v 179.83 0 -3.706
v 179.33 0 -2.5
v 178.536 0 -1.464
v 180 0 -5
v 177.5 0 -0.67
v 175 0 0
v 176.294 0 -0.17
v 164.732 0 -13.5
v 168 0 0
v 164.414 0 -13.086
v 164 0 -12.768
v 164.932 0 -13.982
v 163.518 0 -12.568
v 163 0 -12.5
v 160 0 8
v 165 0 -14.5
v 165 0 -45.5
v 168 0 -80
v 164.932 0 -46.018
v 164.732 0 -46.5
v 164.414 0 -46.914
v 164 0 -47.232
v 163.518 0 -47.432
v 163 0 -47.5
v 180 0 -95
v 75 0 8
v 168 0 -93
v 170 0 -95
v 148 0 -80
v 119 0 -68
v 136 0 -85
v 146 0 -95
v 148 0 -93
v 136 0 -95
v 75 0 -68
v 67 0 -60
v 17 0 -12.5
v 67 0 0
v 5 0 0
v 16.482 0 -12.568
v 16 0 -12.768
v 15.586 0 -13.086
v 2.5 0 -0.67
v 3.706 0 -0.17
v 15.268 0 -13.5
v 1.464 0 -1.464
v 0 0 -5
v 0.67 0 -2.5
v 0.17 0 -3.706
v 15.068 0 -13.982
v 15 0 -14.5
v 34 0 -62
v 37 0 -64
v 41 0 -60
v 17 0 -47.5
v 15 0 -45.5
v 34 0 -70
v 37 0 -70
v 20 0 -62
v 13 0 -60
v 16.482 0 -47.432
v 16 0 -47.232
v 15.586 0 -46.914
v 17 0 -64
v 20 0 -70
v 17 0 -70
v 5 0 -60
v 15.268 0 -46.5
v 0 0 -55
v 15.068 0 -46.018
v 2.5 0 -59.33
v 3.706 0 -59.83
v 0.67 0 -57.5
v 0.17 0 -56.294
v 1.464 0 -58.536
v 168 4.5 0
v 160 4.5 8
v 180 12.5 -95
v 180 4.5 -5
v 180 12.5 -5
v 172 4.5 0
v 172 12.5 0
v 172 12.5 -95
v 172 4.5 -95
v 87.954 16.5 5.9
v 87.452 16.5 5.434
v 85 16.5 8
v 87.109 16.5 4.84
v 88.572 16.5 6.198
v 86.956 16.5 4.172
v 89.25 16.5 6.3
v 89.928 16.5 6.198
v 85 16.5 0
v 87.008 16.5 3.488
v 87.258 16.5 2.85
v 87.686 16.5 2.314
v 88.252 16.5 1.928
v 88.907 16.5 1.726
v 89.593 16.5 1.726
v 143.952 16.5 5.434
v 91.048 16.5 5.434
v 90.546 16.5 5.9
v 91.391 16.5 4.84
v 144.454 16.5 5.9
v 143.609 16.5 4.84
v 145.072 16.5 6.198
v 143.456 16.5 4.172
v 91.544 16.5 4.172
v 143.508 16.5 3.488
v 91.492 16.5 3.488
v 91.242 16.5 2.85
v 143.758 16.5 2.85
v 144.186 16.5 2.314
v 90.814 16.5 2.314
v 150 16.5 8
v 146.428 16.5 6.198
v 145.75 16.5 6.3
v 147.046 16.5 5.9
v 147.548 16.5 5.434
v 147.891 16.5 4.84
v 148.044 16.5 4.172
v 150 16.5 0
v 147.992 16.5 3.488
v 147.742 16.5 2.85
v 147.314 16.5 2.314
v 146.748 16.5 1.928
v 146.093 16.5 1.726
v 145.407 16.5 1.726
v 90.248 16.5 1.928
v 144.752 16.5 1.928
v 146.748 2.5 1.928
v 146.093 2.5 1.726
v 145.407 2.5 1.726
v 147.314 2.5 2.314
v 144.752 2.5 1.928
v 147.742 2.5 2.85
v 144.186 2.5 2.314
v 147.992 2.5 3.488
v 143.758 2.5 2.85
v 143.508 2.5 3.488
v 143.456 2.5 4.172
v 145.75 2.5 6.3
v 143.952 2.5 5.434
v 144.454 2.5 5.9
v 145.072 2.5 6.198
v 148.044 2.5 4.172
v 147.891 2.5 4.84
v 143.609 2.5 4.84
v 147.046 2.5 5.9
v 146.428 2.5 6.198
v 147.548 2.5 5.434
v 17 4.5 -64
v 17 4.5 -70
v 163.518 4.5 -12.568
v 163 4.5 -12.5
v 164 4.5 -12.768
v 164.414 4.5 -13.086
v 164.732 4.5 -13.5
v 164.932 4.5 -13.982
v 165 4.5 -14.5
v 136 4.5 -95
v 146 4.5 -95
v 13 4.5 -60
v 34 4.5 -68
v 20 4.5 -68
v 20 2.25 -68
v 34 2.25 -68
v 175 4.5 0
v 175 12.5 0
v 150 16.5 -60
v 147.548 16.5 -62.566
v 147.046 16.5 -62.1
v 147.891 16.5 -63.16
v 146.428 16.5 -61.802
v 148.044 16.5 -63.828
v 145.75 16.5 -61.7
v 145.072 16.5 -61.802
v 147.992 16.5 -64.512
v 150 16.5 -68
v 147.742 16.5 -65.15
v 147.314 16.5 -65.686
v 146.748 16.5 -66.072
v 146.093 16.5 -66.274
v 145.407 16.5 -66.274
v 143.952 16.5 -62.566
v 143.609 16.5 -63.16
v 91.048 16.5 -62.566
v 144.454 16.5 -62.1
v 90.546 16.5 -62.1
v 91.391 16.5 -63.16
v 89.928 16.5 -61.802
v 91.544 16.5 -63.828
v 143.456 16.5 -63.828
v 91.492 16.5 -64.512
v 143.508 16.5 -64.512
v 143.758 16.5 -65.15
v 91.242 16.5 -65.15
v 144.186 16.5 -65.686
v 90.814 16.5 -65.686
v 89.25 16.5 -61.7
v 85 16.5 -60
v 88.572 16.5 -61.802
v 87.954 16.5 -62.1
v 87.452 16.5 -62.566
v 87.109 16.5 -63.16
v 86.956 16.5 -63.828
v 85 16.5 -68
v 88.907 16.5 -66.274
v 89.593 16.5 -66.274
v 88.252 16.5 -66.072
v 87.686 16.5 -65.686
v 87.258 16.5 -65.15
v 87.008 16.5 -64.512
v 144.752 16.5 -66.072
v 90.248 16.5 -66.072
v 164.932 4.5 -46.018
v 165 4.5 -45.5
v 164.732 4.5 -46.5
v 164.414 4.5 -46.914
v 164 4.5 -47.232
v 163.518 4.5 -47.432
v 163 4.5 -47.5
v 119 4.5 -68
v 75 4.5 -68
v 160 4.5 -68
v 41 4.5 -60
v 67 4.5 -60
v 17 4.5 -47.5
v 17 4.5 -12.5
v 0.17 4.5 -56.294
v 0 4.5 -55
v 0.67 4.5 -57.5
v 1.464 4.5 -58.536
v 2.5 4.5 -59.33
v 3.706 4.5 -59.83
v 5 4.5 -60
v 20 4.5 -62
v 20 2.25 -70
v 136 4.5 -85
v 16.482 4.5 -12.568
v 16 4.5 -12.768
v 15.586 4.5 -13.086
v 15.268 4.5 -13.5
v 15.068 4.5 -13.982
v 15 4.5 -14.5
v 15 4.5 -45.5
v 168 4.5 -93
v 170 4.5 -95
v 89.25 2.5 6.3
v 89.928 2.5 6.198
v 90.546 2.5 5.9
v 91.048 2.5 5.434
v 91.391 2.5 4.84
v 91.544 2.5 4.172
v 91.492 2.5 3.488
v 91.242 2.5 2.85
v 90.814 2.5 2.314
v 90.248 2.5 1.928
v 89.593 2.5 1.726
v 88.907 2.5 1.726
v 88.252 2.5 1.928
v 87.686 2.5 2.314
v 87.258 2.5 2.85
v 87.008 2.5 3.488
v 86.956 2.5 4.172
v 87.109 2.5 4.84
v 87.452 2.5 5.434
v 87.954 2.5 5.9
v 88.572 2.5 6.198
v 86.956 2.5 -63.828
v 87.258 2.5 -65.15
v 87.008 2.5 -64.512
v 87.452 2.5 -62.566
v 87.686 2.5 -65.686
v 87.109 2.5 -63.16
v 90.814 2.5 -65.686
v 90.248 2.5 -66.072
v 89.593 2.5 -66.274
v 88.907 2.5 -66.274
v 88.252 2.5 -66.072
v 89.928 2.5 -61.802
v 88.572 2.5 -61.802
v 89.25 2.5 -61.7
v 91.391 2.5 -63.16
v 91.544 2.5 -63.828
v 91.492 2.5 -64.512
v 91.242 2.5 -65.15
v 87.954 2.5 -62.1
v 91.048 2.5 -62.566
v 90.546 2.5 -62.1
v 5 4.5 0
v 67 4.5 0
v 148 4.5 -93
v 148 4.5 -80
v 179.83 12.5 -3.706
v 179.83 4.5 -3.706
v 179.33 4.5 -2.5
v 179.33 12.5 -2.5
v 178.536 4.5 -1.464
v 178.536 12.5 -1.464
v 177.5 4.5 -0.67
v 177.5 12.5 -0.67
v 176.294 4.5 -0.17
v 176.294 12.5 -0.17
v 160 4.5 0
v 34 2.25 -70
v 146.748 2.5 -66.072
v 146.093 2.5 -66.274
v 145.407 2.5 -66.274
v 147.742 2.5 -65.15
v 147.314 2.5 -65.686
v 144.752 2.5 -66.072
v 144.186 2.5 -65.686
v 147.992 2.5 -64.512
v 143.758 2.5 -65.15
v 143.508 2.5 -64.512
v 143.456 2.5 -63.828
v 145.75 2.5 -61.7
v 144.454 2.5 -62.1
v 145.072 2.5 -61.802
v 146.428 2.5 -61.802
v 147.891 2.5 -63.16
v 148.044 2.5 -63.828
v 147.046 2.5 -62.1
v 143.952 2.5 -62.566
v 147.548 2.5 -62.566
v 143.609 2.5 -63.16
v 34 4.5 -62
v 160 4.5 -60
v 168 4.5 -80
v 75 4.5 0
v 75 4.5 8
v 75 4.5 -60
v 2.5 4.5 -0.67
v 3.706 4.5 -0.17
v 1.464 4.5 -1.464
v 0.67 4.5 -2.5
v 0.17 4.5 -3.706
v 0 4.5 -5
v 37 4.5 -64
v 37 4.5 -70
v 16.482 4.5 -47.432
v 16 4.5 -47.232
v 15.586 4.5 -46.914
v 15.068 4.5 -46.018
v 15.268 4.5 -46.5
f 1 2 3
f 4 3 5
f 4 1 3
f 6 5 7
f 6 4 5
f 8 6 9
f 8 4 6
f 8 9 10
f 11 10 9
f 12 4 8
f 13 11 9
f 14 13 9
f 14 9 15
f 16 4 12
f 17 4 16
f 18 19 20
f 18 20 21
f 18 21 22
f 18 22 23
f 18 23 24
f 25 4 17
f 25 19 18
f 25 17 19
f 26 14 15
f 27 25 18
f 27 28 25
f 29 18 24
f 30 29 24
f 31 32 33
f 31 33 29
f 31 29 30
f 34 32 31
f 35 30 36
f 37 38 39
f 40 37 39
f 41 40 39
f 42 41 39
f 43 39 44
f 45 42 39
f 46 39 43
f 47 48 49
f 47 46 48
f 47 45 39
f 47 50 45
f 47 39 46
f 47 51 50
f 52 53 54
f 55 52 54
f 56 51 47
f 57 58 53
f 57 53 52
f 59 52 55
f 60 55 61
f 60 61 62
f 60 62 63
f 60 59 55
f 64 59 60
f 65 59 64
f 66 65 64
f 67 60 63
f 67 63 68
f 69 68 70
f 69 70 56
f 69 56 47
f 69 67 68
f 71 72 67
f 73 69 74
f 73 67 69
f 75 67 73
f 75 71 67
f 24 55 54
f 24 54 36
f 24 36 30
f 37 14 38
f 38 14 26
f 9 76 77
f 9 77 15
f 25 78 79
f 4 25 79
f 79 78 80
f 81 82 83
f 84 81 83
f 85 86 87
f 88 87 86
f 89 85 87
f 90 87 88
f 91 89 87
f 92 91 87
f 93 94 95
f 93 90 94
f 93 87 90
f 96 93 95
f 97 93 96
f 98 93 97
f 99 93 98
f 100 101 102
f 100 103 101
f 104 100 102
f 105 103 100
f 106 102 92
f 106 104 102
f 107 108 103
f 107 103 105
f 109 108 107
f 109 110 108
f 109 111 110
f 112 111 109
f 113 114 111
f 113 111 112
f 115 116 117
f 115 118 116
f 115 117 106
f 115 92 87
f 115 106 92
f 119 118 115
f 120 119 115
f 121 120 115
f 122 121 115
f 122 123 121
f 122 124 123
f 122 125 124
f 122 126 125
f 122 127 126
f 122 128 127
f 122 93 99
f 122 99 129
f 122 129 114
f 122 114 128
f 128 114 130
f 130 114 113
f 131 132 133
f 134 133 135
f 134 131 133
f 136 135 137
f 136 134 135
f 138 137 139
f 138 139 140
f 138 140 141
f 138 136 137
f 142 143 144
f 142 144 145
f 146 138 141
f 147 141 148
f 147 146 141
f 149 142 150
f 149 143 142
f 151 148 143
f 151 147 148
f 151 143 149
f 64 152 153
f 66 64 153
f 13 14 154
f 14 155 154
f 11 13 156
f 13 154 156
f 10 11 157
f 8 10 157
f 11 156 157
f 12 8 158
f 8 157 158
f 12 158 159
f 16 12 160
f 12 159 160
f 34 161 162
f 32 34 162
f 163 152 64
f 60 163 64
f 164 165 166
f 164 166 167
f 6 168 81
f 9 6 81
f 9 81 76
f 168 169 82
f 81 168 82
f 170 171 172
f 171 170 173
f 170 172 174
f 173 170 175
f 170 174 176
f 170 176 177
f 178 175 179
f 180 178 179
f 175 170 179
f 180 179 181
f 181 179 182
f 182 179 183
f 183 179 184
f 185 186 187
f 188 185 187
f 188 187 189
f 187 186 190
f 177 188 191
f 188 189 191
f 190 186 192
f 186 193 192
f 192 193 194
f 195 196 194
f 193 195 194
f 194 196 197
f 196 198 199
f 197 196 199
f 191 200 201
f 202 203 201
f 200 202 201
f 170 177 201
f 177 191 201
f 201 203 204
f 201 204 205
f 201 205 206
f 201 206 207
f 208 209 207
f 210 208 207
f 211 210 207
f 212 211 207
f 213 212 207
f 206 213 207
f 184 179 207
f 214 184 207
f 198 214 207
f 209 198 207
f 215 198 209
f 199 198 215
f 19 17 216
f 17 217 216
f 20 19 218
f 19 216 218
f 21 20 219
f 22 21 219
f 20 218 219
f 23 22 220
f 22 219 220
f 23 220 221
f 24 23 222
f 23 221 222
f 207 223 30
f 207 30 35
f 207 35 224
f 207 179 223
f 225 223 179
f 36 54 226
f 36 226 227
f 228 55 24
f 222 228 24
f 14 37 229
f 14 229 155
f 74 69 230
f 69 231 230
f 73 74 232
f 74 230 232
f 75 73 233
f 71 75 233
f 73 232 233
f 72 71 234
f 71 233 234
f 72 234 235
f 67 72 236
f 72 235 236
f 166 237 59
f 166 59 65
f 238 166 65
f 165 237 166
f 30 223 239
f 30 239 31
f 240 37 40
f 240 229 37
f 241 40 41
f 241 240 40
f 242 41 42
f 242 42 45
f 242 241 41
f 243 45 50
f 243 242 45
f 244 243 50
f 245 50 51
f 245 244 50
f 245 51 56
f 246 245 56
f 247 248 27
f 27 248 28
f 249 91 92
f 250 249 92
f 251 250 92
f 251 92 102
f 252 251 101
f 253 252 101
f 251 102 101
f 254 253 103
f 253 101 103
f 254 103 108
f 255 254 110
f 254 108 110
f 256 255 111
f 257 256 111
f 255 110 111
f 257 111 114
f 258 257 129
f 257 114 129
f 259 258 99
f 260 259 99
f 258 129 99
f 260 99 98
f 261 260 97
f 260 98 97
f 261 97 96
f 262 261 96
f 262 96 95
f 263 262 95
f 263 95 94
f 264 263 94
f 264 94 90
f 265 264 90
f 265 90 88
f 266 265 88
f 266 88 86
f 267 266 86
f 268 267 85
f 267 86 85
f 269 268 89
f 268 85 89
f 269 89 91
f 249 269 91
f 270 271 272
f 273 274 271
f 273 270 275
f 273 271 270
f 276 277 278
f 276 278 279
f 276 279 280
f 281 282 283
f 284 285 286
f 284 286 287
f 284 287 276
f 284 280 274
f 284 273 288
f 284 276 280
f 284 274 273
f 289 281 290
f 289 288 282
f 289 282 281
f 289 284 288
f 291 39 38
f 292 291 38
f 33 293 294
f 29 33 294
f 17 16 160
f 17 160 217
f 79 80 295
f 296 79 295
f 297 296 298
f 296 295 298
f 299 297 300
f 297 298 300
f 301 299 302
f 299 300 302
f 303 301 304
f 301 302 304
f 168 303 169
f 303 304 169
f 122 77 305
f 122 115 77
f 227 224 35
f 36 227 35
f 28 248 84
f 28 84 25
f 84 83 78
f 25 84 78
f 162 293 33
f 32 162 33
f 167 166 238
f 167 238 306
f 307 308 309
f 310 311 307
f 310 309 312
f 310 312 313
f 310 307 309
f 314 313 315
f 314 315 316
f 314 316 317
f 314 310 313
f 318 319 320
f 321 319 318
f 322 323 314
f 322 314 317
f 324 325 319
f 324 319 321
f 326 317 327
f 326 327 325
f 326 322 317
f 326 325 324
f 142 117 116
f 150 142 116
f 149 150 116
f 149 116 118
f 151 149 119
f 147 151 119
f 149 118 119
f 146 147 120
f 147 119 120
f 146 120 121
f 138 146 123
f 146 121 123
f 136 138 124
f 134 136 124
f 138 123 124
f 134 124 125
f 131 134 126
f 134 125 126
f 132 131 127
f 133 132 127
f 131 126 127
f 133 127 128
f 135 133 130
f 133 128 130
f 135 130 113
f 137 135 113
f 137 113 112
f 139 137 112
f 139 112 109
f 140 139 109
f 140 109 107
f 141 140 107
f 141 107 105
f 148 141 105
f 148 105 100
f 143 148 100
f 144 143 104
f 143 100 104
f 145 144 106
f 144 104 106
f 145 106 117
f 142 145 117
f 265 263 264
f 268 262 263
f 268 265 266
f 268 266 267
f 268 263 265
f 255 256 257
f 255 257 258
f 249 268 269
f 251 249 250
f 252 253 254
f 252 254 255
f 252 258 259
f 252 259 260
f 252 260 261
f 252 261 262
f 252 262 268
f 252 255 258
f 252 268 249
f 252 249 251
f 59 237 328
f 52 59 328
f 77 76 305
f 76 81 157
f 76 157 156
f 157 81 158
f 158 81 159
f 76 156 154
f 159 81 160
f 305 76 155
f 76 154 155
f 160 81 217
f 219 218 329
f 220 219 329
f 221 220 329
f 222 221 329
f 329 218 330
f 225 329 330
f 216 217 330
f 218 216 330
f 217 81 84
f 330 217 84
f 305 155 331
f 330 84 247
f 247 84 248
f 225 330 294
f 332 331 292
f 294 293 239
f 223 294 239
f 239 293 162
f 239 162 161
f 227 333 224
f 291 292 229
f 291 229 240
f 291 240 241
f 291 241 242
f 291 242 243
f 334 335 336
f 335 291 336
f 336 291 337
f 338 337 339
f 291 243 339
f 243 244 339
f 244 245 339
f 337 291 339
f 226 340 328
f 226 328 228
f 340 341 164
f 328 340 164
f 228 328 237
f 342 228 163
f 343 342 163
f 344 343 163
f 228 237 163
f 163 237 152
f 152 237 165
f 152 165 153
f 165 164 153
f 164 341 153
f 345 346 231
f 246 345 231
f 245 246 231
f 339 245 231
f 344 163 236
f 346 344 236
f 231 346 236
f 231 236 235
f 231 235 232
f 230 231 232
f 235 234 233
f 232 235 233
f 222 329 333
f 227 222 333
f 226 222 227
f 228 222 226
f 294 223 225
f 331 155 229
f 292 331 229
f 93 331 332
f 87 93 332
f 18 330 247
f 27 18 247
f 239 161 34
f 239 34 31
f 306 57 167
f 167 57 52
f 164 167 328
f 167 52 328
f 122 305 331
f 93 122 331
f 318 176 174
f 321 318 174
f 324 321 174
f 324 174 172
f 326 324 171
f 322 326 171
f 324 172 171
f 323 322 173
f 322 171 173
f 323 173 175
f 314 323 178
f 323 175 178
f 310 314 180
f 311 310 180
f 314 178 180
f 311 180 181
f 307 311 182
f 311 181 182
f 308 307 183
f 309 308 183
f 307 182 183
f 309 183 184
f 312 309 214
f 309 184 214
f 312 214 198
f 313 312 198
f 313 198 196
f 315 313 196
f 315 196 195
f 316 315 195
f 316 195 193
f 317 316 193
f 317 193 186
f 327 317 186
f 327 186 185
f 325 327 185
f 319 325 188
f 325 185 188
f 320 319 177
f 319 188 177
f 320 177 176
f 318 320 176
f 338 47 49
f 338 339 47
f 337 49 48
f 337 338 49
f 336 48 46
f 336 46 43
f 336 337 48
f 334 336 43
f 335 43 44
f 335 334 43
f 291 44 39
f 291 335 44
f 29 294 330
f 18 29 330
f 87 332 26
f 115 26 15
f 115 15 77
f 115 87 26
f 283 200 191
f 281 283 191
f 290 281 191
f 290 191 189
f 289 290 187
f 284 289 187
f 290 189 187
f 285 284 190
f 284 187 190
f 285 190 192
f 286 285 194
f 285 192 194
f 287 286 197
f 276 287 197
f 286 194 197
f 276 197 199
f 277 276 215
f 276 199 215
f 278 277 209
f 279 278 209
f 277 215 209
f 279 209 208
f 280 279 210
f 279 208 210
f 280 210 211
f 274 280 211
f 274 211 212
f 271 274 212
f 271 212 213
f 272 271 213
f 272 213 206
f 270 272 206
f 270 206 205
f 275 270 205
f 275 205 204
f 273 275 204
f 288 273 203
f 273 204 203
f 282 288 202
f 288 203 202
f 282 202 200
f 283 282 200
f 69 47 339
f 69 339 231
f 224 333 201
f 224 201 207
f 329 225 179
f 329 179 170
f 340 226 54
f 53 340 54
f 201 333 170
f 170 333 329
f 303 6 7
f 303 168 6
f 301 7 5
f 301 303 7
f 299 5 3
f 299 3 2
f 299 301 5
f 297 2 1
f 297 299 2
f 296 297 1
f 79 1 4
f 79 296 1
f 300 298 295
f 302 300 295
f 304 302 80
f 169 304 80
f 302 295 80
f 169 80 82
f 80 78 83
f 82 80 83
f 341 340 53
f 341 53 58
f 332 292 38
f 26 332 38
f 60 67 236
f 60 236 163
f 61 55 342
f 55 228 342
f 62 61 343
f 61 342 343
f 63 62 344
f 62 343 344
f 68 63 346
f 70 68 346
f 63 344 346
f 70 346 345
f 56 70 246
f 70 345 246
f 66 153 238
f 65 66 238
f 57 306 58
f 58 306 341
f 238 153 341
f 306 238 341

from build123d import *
from OCP.BRepFilletAPI import BRepFilletAPI_MakeChamfer

# Parameters (mm, degrees)
SKETCH1_W                       = 180
SKETCH1_H                       = 60
SKETCH1_W_2                     = 150
SKETCH1_H_2                     = 35
BOSS_EXTRUDE1_DEPTH             = 4.5
FILLET1_R                       = 5
FILLET2_R                       = 2
BOSS_EXTRUDE2_DEPTH             = 4.5
CHAMFER1_SIZE                   = 25
CHAMFER2_SIZE                   = 2
BOSS_EXTRUDE3_DEPTH             = 12
BOSS_EXTRUDE3_DIRECTION_2_REACH = 205.581
CHAMFER3_SIZE                   = 10
CHAMFER3_SIZE_2                 = 12
CHAMFER4_SIZE                   = 8
BOSS_EXTRUDE4_START             = 8
BOSS_EXTRUDE4_DEPTH             = 8
SKETCH5_R                       = 2.3
CUT_EXTRUDE1_DEPTH              = 14
CHAMFER5_SIZE                   = 12
CHAMFER5_SIZE2                  = 10
SKETCH6_W                       = 20
SKETCH6_H                       = 10
SKETCH6_W_2                     = 14
SKETCH6_H_2                     = 6
BOSS_EXTRUDE5_DEPTH             = 4.5
CHAMFER6_SIZE                   = 4
SKETCH7_W                       = 14
SKETCH7_H                       = 2.25
CUT_EXTRUDE2_DEPTH              = 3


with BuildPart() as part:
    # Sketch1 → Boss-Extrude1 (new body)
    with BuildSketch(Plane(origin=(0, 0, 0), x_dir=(1, 0, 0), z_dir=(0, 1, 0))):
        with Locations((90, 30)):
            Rectangle(SKETCH1_W, SKETCH1_H)
        with Locations((90, 30)):
            Rectangle(SKETCH1_W_2, SKETCH1_H_2, mode=Mode.SUBTRACT)
    extrude(amount=BOSS_EXTRUDE1_DEPTH)

    # Fillet1
    fillet1_edges = [part.edges().sort_by_distance(p)[0] for p in [
        (0, 2.25, -60),
        (180, 2.25, 0),
        (0, 2.25, 0),
    ]]
    fillet(fillet1_edges, radius=FILLET1_R)

    # Fillet2
    fillet2_edges = [part.edges().sort_by_distance(p)[0] for p in [
        (165, 2.25, -12.5),
        (165, 2.25, -47.5),
        (15, 2.25, -47.5),
        (15, 2.25, -12.5),
    ]]
    fillet(fillet2_edges, radius=FILLET2_R)

    # Sketch2 → Boss-Extrude2 (add)
    with BuildSketch(Plane(origin=(0, 4.5, 0), x_dir=(1, 0, 0), z_dir=(0, 1, 0))):
        Polygon((180, 80), (180, 60), (136, 60), (136, 80), (136, 95), (148, 95), (148, 80), (168, 80), (168, 95), (180, 95), align=None)
    extrude(amount=-BOSS_EXTRUDE2_DEPTH)

    # Chamfer1
    chamfer1_edges = [part.edges().sort_by_distance(p)[0] for p in [
        (136, 2.25, -60),
    ]]
    chamfer(chamfer1_edges, length=CHAMFER1_SIZE)

    # Chamfer2
    chamfer2_edges = [part.edges().sort_by_distance(p)[0] for p in [
        (168, 2.25, -95),
        (148, 2.25, -95),
    ]]
    chamfer(chamfer2_edges, length=CHAMFER2_SIZE)

    # Sketch3 → Boss-Extrude3 (add)
    with BuildSketch(Plane(origin=(0, 4.5, 0), x_dir=(1, 0, 0), z_dir=(0, 1, 0))):
        Polygon((90, -8), (160, -8), (160, 0), (90, 0), (75, 0), (75, -8), align=None)
        Polygon((160, 60), (90, 60), (75, 60), (75, 68), (90, 68), (160, 68), align=None)
    extrude(amount=BOSS_EXTRUDE3_DEPTH)

    # Boss-Extrude3 direction 2: up to this face of the body (flat: up to its plane)
    boss_extrude3_direction_2_end = Plane(part.part.faces().sort_by_distance((141, 0, -92.964686756))[0])
    # Sketch3 → Boss-Extrude3 direction 2 (add, up to the picked face)
    with BuildSketch(Plane(origin=(0, 4.5, 0), x_dir=(1, 0, 0), z_dir=(0, 1, 0)), mode=Mode.PRIVATE) as boss_extrude3_direction_2_sk1:
        Polygon((90, -8), (160, -8), (160, 0), (90, 0), (75, 0), (75, -8), align=None)
    boss_extrude3_direction_2_tool1 = split(extrude(boss_extrude3_direction_2_sk1.sketch, amount=-BOSS_EXTRUDE3_DIRECTION_2_REACH, mode=Mode.PRIVATE), bisect_by=boss_extrude3_direction_2_end, keep=Keep.BOTH, mode=Mode.PRIVATE)
    # Sketch3 → Boss-Extrude3 direction 2 (add, up to the picked face)
    with BuildSketch(Plane(origin=(0, 4.5, 0), x_dir=(1, 0, 0), z_dir=(0, 1, 0)), mode=Mode.PRIVATE) as boss_extrude3_direction_2_sk2:
        Polygon((160, 60), (90, 60), (75, 60), (75, 68), (90, 68), (160, 68), align=None)
    boss_extrude3_direction_2_tool2 = split(extrude(boss_extrude3_direction_2_sk2.sketch, amount=-BOSS_EXTRUDE3_DIRECTION_2_REACH, mode=Mode.PRIVATE), bisect_by=boss_extrude3_direction_2_end, keep=Keep.BOTH, mode=Mode.PRIVATE)
    add(boss_extrude3_direction_2_tool1.solids().sort_by(Axis((117.5, 4.5, 4), (0, -1, 0)))[0])
    add(boss_extrude3_direction_2_tool2.solids().sort_by(Axis((117.5, 4.5, -64), (0, -1, 0)))[0])

    # Chamfer3
    chamfer3_edges_1 = [part.edges().sort_by_distance(p)[0] for p in [
        (160, 16.5, -64),
    ]]
    chamfer3_side_1 = [part.faces().sort_by_distance(p)[0] for p in [
        (159.8, 16.5, -64),
    ]]
    chamfer3_edges_2 = [part.edges().sort_by_distance(p)[0] for p in [
        (75, 16.5, -64),
    ]]
    chamfer3_side_2 = [part.faces().sort_by_distance(p)[0] for p in [
        (75.2, 16.5, -64),
    ]]
    chamfer3_edges_3 = [part.edges().sort_by_distance(p)[0] for p in [
        (75, 16.5, 4),
    ]]
    chamfer3_side_3 = [part.faces().sort_by_distance(p)[0] for p in [
        (75.2, 16.5, 4),
    ]]
    chamfer3 = BRepFilletAPI_MakeChamfer(part.part.solid().wrapped)
    for e in chamfer3_edges_1:
        chamfer3.Add(CHAMFER3_SIZE - 0.0001, CHAMFER3_SIZE_2 - 0.0001, e.wrapped, chamfer3_side_1[0].wrapped)
    for e in chamfer3_edges_2:
        chamfer3.Add(CHAMFER3_SIZE - 0.0001, CHAMFER3_SIZE_2 - 0.0001, e.wrapped, chamfer3_side_2[0].wrapped)
    for e in chamfer3_edges_3:
        chamfer3.Add(CHAMFER3_SIZE - 0.0001, CHAMFER3_SIZE_2 - 0.0001, e.wrapped, chamfer3_side_3[0].wrapped)
    add(Compound.cast(chamfer3.Shape()), mode=Mode.REPLACE)  # a hair under: the kernel refuses the full size

    # Chamfer4
    chamfer4_edges = [part.edges().sort_by_distance(p)[0] for p in [
        (160, 2.25, 0),
        (75, 2.25, 0),
        (75, 2.25, -60),
    ]]
    chamfer(chamfer4_edges, length=CHAMFER4_SIZE - 0.0001)  # a hair under: the kernel refuses the full size

    # Sketch4 → Boss-Extrude4 (add)
    with BuildSketch(Plane(origin=(0, 4.5, 0), x_dir=(1, 0, 0), z_dir=(0, 1, 0)).offset(BOSS_EXTRUDE4_START)):
        with BuildLine():
            Line((180, 95), (180, 5))
            ThreePointArc((180, 5), (178.535533906, 1.464466094), (175, 0))
            Line((175, 0), (172, 0))
            Line((172, 0), (172, 95))
            Line((172, 95), (180, 95))
        make_face()
    extrude(amount=-BOSS_EXTRUDE4_DEPTH)

    # Sketch5 → Cut-Extrude1 (cut)
    with BuildSketch(Plane(origin=(0, 16.5, 0), x_dir=(1, 0, 0), z_dir=(0, 1, 0))):
        with Locations(Location((89.25, 64, 0), (0, 0, 270))):
            Circle(SKETCH5_R)
        with Locations(Location((145.75, 64, 0), (0, 0, 270))):
            Circle(SKETCH5_R)
        with Locations(Location((145.75, -4, 0), (0, 0, 270))):
            Circle(SKETCH5_R)
        with Locations(Location((89.25, -4, 0), (0, 0, 270))):
            Circle(SKETCH5_R)
    extrude(amount=-CUT_EXTRUDE1_DEPTH, mode=Mode.SUBTRACT)

    # Chamfer5
    chamfer5_edges = [part.edges().sort_by_distance(p)[0] for p in [
        (160, 16.5, 4),
    ]]
    chamfer5_side = [part.faces().sort_by_distance(p)[0] for p in [
        (160, 10.499961328, 4.00001875),
    ]]
    chamfer(chamfer5_edges, length=CHAMFER5_SIZE, length2=CHAMFER5_SIZE2, reference=chamfer5_side[0])

    # Sketch6 → Boss-Extrude5 (add)
    # profile 1 of 2: a face of its own
    with BuildSketch(Plane(origin=(0, 4.5, 0), x_dir=(1, 0, 0), z_dir=(0, 1, 0))):
        with Locations((27, 65)):
            Rectangle(SKETCH6_W, SKETCH6_H)
        with Locations((27, 65)):
            Rectangle(SKETCH6_W_2, SKETCH6_H_2, mode=Mode.SUBTRACT)
    # profile 2 of 2: a face of its own
    with BuildSketch(Plane(origin=(0, 4.5, 0), x_dir=(1, 0, 0), z_dir=(0, 1, 0))):
        with BuildLine():
            Line((168, 0), (172, 0))
            Line((172, 0), (172, 95))
            Line((172, 95), (170, 95))
            Line((170, 95), (168, 93))
            Line((168, 93), (168, 80))
            Line((168, 80), (148, 80))
            Line((148, 80), (148, 93))
            Line((148, 93), (146, 95))
            Line((146, 95), (136, 95))
            Line((136, 95), (136, 85))
            Line((136, 85), (119, 68))
            Line((119, 68), (160, 68))
            Line((160, 68), (160, 60))
            Line((160, 60), (75, 60))
            Line((75, 60), (75, 68))
            Line((75, 68), (67, 60))
            Line((67, 60), (5, 60))
            ThreePointArc((5, 60), (1.464466094, 58.535533906), (0, 55))
            Line((0, 55), (0, 5))
            ThreePointArc((0, 5), (1.464466094, 1.464466094), (5, 0))
            Line((5, 0), (67, 0))
            Line((67, 0), (75, -8))
            Line((75, -8), (75, 0))
            Line((75, 0), (160, 0))
            Line((160, 0), (160, -8))
            Line((160, -8), (168, 0))
        make_face()
        with BuildLine():
            ThreePointArc((163, 47.5), (164.414213562, 46.914213562), (165, 45.5))
            Line((165, 45.5), (165, 14.5))
            ThreePointArc((165, 14.5), (164.414213562, 13.085786438), (163, 12.5))
            Line((163, 12.5), (17, 12.5))
            ThreePointArc((17, 12.5), (15.585786438, 13.085786438), (15, 14.5))
            Line((15, 14.5), (15, 45.5))
            ThreePointArc((15, 45.5), (15.585786438, 46.914213562), (17, 47.5))
            Line((17, 47.5), (163, 47.5))
        make_face(mode=Mode.SUBTRACT)
    extrude(amount=-BOSS_EXTRUDE5_DEPTH)

    # Chamfer6
    chamfer6_edges = [part.edges().sort_by_distance(p)[0] for p in [
        (17, 2.25, -60),
        (37, 2.25, -60),
    ]]
    chamfer(chamfer6_edges, length=CHAMFER6_SIZE)

    # Sketch7 → Cut-Extrude2 (cut)
    with BuildSketch(Plane.XY.offset(-68)):
        with Locations((27, 1.125)):
            Rectangle(SKETCH7_W, SKETCH7_H)
    extrude(amount=-CUT_EXTRUDE2_DEPTH, mode=Mode.SUBTRACT)


solid = part.part
